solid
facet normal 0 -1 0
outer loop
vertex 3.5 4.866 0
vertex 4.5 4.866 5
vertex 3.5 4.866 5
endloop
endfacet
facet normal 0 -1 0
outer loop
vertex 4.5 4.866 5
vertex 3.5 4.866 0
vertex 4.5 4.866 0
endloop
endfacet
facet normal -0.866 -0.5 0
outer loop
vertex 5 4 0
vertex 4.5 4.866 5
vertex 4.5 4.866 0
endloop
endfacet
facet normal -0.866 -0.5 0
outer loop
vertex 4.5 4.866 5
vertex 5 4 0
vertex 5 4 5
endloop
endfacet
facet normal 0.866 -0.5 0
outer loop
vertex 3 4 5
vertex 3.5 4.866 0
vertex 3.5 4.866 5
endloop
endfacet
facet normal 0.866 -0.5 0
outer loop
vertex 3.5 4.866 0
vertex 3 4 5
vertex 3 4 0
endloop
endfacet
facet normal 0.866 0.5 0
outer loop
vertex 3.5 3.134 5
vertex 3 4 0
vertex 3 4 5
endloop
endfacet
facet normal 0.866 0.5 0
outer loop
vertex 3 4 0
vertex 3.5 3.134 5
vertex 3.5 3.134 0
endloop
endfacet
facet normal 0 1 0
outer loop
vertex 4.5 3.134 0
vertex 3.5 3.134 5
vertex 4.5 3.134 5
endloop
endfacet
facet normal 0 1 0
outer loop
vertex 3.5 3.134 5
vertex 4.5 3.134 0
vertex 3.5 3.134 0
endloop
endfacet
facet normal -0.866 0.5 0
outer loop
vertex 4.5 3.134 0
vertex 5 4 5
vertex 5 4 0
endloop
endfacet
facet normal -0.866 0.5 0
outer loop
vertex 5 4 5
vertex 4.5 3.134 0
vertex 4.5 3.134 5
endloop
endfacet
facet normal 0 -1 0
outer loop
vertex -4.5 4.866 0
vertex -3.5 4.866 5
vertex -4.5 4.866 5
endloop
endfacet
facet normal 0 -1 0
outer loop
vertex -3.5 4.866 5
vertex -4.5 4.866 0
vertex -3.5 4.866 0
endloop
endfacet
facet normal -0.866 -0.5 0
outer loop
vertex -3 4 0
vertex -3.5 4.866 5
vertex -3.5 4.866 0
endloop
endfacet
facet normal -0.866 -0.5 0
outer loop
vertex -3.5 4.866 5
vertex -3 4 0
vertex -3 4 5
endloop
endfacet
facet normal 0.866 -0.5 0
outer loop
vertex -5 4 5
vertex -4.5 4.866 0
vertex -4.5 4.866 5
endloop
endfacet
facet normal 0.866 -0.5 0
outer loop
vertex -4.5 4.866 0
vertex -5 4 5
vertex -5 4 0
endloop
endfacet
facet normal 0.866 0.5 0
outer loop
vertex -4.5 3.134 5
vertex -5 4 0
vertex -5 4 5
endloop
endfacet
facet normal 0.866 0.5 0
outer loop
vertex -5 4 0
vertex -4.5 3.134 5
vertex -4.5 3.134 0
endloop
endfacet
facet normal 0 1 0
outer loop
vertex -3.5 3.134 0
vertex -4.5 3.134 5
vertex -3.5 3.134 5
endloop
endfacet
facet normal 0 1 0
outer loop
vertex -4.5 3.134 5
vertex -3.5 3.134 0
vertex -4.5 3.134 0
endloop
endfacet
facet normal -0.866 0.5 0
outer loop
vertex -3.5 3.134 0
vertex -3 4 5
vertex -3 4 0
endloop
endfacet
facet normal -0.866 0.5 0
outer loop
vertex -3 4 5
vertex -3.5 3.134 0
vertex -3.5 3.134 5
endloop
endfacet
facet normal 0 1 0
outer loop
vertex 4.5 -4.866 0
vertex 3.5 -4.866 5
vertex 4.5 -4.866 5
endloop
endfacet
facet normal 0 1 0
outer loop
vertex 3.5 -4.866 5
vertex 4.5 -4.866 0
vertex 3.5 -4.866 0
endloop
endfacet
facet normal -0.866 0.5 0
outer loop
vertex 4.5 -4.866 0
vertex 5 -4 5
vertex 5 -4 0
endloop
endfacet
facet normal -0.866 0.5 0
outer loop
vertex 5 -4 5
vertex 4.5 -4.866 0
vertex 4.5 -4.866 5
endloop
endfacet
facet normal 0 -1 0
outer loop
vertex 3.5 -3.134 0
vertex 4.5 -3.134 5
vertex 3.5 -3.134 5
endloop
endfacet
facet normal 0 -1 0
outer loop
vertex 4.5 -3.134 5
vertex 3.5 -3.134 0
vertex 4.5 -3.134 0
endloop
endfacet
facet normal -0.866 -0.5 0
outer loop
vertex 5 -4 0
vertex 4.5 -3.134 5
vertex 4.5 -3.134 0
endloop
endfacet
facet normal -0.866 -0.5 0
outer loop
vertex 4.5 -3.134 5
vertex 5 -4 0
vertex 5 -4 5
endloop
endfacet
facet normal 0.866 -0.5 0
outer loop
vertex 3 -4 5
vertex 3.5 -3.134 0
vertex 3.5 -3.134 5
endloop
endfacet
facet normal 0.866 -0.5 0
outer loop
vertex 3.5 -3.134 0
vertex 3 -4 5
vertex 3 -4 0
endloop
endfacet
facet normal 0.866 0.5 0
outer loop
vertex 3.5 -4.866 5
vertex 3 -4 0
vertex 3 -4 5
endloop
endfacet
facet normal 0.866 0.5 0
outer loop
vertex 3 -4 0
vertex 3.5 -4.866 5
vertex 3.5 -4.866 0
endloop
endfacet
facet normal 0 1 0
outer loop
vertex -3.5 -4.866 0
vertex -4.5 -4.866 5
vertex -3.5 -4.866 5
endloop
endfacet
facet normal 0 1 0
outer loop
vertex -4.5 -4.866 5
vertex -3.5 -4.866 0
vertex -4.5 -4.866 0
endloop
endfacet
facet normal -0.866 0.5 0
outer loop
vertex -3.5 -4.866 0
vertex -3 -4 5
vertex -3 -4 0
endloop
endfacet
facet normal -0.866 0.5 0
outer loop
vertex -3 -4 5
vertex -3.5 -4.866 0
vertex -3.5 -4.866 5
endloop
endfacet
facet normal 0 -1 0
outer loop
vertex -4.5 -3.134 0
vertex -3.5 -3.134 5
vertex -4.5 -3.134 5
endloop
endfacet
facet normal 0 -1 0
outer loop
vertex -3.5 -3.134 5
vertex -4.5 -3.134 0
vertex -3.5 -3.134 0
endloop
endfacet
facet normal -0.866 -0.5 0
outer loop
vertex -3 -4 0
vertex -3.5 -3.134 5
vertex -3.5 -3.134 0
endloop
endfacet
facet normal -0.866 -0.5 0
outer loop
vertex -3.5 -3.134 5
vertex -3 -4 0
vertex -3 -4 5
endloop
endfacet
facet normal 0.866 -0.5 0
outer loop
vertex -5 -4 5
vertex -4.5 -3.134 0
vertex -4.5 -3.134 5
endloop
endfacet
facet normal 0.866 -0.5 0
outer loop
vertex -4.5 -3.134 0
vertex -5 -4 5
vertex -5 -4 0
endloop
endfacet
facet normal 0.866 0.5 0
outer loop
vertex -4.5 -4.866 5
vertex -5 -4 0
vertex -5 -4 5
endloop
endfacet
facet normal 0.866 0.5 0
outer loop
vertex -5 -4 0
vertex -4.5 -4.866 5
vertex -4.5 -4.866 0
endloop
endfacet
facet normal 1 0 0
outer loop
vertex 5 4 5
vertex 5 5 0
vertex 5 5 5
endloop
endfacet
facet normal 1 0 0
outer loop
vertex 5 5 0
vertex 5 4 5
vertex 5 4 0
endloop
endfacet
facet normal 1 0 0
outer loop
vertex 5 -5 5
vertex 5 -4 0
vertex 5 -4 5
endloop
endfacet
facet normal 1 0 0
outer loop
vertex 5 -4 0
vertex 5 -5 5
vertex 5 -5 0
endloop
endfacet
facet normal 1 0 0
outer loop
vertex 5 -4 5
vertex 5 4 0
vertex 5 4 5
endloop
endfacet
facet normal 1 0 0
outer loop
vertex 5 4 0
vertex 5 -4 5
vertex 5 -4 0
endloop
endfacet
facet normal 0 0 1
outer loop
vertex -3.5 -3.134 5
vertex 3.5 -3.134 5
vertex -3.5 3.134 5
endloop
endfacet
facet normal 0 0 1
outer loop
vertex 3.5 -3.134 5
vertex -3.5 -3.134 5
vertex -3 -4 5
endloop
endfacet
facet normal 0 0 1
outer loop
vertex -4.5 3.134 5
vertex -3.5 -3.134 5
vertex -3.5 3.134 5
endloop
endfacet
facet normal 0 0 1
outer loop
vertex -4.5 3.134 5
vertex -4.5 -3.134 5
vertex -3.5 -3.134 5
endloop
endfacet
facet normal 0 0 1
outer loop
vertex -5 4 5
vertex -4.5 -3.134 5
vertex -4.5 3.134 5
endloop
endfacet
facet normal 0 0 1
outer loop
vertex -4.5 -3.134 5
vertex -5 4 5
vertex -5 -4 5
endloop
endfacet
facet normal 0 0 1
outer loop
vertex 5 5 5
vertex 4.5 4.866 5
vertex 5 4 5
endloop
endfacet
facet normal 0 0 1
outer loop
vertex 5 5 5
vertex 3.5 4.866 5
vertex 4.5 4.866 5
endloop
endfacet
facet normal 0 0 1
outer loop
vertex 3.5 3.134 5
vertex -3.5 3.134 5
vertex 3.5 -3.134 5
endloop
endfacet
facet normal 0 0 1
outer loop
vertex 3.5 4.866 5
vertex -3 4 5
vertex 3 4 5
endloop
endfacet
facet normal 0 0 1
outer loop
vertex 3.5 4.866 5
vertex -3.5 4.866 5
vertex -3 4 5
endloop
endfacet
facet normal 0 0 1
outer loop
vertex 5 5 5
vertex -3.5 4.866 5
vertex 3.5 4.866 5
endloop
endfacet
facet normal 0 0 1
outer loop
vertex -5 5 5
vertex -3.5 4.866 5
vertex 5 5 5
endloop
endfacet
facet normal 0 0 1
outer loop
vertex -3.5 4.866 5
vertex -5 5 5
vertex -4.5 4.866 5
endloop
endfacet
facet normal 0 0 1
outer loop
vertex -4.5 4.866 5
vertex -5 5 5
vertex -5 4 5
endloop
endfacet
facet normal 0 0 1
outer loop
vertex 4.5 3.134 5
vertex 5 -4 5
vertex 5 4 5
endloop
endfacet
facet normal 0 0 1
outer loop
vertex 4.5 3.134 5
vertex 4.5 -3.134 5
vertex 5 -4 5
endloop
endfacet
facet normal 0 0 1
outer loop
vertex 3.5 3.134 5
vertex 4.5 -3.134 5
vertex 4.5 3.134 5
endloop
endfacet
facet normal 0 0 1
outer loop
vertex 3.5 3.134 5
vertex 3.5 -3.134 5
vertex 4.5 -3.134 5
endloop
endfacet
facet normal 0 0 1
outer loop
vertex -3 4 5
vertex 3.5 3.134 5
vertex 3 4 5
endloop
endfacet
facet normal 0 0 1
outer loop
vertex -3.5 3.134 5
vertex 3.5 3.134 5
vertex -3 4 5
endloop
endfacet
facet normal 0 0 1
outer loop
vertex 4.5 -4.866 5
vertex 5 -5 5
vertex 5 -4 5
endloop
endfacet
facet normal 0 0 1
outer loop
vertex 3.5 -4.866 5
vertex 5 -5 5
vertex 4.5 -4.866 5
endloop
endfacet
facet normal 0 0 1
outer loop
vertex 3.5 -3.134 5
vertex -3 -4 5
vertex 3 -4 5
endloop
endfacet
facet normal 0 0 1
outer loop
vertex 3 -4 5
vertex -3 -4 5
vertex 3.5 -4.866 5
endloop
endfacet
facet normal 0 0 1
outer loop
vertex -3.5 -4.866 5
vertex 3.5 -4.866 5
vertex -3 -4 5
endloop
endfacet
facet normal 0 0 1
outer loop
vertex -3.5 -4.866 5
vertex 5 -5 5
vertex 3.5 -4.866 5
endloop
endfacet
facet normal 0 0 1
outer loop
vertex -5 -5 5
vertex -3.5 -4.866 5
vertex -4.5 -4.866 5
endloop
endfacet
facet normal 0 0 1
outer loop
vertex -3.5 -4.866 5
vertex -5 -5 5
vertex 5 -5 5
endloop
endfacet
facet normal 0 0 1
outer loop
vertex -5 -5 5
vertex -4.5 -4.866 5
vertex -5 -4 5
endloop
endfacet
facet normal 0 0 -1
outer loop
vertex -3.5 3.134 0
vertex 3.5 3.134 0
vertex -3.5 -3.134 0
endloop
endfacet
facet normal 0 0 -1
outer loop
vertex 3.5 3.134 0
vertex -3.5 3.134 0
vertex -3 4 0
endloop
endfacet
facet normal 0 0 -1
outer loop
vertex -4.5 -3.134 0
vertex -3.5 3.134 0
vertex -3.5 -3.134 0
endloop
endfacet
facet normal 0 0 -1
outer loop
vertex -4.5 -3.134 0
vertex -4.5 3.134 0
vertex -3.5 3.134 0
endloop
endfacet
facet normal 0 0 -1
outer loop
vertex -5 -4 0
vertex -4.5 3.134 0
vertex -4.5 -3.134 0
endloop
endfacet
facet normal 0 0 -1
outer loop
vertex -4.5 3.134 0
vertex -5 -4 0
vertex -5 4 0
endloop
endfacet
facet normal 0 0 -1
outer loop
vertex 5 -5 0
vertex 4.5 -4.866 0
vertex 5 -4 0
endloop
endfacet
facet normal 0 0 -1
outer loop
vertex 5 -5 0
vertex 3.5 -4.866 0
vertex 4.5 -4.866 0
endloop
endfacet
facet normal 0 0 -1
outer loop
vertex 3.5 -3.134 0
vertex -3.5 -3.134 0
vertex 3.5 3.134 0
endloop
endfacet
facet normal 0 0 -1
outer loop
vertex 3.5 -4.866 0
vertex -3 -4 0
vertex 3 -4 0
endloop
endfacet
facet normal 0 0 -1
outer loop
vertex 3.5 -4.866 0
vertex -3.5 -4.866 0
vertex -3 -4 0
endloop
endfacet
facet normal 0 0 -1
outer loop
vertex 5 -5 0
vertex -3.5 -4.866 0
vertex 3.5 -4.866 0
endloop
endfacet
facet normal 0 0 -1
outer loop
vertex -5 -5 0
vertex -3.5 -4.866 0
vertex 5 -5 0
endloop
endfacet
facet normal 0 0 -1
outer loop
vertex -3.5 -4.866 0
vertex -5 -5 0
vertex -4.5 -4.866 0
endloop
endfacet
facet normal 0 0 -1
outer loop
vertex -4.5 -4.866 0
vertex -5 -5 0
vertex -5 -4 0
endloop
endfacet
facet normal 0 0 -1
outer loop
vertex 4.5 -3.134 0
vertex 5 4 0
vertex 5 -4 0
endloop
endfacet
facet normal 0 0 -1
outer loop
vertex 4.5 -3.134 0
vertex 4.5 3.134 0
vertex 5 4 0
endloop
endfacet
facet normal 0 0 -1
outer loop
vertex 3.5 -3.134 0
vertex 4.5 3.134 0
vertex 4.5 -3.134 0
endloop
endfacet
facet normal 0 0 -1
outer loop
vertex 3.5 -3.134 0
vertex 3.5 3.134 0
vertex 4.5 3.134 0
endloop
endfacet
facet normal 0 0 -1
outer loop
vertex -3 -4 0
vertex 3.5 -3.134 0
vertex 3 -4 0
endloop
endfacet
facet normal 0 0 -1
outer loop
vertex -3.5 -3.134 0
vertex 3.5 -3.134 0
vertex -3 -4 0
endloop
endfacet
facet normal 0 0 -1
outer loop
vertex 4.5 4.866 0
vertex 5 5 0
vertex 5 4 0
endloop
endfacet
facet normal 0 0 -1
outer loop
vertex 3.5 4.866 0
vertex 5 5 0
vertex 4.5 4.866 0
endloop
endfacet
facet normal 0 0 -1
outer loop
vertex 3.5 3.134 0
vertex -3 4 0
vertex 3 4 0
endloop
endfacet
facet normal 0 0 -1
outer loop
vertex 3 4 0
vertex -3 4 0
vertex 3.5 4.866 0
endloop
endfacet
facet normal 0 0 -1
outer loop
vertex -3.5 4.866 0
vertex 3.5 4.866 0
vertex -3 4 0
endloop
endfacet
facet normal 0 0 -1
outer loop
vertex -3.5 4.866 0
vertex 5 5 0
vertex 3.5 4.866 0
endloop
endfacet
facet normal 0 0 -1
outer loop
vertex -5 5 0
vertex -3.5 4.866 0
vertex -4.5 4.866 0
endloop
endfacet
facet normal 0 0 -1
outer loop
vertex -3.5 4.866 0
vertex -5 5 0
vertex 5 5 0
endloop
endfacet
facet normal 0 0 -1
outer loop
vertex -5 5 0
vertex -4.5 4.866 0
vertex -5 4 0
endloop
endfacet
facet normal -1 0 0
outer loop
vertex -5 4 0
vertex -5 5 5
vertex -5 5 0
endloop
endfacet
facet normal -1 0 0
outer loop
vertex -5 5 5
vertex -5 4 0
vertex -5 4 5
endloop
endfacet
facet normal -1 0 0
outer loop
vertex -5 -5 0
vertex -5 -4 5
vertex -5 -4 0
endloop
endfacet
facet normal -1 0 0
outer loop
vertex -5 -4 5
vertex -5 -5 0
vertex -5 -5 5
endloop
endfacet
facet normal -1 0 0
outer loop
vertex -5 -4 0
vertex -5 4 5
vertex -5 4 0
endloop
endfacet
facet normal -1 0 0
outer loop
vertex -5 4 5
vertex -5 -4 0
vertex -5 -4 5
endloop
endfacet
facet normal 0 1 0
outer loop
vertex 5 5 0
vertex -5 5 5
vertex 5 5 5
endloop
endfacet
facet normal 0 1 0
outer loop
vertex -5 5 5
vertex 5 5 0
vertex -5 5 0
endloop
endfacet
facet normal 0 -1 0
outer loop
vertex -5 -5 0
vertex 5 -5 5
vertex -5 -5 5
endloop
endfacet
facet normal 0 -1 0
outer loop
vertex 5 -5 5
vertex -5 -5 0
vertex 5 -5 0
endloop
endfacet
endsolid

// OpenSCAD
module mount_holes(mount_w, mount_d, hole_w, hole_h, fn=30, wtol=0.0, htol=0.01) {
  x = mount_w / 2;
  y = mount_d / 2;
  z = hole_h / 2;

  hole_positions = [[x, y, z], [-x, y, z], [x, -y, z], [-x, -y, z]];
  for (i = [0:3]) {
    translate(hole_positions[i])
      cylinder(r=(hole_w + wtol) / 2, h=hole_h + htol, $fn=fn, center=true);
  }
}


difference() {
  translate([0, 0, 2.5])
    cube([10, 10, 5], center=true);

  #mount_holes(8, 8, 2, 5, fn=6);
}
